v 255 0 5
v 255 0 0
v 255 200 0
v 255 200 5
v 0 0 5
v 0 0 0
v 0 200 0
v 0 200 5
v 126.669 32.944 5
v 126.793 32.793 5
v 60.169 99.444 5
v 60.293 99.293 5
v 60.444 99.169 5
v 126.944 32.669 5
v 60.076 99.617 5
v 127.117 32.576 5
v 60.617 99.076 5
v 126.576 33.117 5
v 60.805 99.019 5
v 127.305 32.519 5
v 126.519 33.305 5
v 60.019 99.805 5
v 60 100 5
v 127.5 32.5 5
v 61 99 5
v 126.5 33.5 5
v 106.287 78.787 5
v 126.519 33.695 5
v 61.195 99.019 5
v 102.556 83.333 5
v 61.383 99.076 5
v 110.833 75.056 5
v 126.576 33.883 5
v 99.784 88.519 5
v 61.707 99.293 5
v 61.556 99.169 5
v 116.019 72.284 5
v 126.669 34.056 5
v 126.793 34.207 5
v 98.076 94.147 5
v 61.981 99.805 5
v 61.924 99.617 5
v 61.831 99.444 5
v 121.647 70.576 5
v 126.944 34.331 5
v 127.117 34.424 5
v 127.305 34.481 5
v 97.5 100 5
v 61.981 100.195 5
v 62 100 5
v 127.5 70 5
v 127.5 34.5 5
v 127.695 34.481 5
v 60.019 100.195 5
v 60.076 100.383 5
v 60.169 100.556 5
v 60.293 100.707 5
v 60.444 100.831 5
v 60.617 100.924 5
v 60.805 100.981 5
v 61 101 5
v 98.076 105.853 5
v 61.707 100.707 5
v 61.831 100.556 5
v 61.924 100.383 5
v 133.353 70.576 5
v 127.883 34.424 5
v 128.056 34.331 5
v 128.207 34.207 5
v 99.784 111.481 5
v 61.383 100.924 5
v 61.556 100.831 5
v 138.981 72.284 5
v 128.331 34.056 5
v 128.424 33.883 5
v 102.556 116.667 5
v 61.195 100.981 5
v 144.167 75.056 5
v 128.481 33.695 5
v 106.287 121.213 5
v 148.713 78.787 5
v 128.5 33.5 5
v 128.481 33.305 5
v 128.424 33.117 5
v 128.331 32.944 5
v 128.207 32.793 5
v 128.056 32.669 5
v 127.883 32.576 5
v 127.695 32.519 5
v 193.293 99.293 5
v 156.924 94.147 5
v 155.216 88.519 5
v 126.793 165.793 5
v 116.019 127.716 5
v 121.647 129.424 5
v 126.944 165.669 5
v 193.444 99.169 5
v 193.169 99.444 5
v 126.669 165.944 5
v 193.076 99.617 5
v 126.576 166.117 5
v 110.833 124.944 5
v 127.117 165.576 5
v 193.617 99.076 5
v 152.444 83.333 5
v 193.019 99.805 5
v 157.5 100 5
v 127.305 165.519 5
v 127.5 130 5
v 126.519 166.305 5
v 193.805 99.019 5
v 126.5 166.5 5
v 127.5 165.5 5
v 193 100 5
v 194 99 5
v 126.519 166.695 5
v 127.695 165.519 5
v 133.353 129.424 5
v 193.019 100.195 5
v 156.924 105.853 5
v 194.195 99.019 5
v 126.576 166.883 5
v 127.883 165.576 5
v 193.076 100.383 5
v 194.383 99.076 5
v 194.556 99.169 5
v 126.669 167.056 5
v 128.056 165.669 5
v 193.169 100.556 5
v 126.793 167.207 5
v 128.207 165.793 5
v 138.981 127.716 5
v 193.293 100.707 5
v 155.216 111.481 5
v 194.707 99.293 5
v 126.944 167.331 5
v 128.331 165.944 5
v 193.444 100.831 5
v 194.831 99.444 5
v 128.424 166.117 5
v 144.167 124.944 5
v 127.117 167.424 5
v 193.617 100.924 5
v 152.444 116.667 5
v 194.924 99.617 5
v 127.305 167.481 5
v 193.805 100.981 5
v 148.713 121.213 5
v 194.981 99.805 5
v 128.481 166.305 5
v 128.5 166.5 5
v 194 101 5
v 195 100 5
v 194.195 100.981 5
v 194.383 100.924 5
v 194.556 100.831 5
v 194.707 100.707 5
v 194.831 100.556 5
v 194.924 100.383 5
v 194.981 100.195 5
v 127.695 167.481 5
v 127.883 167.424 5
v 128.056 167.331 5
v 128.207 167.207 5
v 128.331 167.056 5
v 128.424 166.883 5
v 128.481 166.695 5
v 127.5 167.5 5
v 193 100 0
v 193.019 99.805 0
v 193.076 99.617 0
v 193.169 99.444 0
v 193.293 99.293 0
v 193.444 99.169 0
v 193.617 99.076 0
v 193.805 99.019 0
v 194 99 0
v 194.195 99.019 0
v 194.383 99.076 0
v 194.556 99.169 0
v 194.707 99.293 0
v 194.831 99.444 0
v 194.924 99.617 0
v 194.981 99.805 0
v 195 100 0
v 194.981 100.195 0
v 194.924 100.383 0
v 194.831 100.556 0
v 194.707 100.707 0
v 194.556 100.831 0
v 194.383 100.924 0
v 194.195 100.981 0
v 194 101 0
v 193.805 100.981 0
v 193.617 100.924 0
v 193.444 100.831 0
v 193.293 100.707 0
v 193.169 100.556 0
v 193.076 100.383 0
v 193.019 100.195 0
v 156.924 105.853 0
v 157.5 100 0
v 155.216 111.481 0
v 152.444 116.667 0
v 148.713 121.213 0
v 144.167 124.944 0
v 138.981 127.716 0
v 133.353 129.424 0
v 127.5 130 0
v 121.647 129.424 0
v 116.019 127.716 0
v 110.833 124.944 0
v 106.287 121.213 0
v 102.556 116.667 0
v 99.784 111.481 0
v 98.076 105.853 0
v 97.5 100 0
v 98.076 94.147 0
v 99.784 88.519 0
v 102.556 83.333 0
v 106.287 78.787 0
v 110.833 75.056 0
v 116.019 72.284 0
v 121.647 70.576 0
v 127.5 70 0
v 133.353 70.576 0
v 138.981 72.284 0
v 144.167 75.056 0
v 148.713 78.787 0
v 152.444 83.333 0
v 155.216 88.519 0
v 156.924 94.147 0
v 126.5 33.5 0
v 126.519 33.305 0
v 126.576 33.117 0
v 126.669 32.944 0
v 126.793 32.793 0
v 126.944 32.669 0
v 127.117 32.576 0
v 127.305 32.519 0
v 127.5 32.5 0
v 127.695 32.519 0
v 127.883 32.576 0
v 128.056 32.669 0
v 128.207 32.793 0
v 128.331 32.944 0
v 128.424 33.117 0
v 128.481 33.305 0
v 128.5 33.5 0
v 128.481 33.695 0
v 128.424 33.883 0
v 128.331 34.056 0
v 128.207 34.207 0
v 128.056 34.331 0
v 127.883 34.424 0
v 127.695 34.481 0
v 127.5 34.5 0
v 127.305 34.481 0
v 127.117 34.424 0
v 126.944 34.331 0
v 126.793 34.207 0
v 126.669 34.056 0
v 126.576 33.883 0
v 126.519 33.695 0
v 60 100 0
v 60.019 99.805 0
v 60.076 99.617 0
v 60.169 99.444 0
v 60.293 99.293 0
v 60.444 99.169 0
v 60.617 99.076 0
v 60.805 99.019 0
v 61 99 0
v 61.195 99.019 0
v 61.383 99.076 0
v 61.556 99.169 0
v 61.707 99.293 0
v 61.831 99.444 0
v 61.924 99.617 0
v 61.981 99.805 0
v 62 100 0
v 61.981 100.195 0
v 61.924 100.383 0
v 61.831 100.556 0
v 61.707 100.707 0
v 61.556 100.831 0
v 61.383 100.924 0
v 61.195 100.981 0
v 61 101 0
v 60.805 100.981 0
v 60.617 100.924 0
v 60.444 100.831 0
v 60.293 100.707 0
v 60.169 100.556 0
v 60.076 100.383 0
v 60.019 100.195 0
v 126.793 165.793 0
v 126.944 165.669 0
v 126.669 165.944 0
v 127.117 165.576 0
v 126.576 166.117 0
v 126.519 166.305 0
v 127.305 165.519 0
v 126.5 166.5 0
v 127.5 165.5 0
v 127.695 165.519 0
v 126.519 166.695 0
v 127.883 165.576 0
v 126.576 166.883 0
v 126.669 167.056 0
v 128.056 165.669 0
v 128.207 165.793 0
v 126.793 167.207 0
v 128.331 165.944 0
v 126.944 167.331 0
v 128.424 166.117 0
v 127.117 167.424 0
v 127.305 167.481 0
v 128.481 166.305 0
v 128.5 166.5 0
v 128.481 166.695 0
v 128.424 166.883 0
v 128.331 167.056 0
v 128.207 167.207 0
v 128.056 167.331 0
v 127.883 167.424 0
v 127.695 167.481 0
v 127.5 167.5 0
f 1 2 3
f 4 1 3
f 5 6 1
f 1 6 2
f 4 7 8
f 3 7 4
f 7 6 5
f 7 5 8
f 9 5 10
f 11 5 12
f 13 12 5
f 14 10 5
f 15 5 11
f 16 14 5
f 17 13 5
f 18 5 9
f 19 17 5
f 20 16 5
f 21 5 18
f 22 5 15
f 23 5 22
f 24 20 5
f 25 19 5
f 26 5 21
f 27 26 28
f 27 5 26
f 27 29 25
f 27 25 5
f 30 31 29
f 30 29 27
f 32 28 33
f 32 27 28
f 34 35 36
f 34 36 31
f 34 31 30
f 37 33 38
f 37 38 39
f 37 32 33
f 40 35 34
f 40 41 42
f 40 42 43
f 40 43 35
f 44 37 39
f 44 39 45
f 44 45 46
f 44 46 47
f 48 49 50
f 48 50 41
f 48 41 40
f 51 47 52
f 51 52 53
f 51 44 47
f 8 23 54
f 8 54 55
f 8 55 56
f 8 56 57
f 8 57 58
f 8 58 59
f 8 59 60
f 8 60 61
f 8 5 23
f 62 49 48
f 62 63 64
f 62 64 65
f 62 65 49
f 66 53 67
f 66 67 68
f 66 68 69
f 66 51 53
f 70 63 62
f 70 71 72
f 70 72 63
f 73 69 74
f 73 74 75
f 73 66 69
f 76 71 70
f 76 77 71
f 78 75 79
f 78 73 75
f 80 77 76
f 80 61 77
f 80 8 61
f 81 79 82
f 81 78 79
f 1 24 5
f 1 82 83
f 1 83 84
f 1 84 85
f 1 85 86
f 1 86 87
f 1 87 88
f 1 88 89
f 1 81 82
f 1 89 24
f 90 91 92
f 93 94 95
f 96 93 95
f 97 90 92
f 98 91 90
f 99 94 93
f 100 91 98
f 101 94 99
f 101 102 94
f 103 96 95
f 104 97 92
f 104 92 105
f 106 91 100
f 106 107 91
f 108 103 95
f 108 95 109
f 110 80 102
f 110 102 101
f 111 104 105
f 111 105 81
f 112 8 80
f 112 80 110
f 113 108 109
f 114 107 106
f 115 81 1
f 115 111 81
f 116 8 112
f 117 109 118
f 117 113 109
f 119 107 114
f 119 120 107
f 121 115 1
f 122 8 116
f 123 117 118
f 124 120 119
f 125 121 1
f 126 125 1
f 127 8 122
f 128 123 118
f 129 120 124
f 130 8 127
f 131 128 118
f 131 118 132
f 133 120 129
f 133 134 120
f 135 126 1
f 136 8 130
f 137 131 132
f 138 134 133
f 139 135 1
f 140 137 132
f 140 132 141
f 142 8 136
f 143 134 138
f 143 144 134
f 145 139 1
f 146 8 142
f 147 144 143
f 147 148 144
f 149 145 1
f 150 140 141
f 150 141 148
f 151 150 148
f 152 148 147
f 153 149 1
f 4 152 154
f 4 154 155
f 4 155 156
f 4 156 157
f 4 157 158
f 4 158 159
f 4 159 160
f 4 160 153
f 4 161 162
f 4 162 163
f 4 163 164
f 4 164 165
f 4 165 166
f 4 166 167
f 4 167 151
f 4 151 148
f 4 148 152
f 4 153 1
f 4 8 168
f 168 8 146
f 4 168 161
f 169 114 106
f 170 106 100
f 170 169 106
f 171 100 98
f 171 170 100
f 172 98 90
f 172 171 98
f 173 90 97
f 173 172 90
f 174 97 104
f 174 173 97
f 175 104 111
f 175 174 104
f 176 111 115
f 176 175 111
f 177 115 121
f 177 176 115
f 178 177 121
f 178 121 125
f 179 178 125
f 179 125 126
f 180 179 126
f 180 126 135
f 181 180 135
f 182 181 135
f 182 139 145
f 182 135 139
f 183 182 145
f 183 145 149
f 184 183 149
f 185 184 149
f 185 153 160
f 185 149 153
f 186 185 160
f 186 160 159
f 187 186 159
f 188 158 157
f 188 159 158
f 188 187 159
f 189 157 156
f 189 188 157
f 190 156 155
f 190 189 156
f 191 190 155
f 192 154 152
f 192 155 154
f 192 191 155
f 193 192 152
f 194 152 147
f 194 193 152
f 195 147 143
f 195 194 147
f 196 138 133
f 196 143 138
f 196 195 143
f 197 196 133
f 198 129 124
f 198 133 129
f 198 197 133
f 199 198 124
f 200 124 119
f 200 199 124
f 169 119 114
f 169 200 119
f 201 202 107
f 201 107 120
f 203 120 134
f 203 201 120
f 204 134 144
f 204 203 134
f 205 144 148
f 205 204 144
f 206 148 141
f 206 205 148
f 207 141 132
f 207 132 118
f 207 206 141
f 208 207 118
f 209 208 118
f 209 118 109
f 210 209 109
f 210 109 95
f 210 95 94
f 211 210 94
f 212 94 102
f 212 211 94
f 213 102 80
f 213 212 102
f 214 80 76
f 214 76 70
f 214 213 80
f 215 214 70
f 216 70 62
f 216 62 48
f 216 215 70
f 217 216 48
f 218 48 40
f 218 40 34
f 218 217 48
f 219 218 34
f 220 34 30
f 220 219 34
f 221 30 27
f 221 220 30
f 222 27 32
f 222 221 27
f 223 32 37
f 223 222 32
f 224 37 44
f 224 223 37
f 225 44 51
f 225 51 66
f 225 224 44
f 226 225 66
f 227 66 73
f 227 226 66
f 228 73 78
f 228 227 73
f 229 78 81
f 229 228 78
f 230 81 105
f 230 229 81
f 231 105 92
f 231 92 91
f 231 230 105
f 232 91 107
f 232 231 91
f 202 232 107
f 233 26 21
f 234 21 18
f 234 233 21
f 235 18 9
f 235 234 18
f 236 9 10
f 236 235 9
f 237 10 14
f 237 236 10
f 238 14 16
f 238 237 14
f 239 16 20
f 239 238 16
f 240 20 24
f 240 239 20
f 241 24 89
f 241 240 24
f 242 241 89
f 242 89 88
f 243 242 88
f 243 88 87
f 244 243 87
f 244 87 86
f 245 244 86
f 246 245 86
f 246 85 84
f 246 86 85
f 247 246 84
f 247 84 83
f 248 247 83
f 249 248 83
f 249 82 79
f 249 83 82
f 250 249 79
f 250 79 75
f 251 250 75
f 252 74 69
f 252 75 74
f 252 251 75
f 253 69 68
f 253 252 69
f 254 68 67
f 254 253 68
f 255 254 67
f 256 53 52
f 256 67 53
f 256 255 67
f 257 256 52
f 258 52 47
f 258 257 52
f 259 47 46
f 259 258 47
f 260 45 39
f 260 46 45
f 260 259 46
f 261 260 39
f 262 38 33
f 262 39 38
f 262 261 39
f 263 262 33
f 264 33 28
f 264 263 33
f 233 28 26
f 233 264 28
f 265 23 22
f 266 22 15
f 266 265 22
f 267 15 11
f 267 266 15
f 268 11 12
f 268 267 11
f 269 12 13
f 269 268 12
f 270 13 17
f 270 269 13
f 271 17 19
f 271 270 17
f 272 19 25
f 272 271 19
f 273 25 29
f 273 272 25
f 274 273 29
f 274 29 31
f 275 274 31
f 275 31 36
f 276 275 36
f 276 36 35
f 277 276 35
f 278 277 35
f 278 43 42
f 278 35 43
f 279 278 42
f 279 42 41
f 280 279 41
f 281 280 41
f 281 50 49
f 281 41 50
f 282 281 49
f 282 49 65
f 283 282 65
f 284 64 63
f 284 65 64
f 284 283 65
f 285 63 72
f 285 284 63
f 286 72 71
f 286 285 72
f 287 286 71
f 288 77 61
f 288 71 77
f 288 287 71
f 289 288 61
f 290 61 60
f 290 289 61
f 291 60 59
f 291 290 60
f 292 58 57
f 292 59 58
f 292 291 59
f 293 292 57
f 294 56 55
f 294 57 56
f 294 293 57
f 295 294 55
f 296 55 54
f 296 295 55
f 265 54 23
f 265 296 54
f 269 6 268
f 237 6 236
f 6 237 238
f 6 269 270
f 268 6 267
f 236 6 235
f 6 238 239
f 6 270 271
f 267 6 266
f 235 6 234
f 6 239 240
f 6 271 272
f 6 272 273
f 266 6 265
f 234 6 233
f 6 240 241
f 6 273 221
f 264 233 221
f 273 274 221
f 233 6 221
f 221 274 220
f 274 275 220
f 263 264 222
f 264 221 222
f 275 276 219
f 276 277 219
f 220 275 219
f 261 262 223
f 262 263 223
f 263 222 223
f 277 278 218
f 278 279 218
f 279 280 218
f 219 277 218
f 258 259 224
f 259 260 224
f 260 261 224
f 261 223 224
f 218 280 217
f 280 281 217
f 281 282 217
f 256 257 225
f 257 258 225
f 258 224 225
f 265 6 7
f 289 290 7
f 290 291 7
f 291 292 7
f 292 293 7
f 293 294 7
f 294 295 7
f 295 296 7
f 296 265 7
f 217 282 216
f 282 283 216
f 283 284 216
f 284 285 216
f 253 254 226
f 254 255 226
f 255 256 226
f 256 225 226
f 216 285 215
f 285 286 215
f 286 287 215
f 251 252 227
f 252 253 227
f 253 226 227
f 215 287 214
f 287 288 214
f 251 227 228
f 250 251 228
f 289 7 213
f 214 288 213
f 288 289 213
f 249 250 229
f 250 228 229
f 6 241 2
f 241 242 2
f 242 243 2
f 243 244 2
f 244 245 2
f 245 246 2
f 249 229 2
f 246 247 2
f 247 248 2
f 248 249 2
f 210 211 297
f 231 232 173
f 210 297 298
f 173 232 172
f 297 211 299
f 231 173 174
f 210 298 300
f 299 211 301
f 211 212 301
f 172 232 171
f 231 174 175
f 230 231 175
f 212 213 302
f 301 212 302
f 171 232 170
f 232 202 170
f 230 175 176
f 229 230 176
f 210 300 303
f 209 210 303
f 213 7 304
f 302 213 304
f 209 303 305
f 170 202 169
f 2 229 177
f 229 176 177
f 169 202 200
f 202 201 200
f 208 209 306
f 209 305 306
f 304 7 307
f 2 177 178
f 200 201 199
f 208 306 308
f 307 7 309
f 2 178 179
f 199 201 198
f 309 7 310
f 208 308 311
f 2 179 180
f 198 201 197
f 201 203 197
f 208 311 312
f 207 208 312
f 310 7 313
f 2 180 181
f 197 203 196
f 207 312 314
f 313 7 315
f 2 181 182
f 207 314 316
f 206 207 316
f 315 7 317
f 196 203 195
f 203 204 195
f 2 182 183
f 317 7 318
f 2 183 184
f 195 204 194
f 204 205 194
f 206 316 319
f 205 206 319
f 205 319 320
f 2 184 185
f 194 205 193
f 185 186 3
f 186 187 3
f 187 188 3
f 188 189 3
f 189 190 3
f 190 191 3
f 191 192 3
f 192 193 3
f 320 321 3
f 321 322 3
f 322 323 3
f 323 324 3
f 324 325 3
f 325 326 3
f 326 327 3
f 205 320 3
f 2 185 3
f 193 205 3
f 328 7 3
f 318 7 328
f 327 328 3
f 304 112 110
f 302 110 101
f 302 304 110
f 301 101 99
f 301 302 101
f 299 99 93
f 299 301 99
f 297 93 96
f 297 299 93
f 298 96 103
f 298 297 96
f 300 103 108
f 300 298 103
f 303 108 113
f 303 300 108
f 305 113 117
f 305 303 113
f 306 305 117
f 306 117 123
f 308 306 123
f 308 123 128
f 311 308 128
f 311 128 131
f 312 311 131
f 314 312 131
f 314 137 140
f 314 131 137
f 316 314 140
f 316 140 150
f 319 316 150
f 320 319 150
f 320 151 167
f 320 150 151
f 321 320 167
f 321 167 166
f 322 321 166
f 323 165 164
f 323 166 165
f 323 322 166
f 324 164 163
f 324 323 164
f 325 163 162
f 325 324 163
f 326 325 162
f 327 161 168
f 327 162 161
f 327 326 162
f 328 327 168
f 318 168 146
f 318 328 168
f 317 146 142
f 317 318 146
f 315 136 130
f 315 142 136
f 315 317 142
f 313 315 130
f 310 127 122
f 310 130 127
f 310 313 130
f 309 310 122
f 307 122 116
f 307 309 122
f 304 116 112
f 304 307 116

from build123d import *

# Parameters (mm, degrees)
SKETCH1_W           = 255
SKETCH1_H           = 200
SKETCH1_R           = 30
BOSS_EXTRUDE1_DEPTH = 5
SKETCH2_R           = 1
CUT_EXTRUDE1_DEPTH  = 28


with BuildPart() as part:
    # Sketch1 → Boss-Extrude1 (new body)
    with BuildSketch(Plane.XY):
        with Locations((127.5, 100)):
            Rectangle(SKETCH1_W, SKETCH1_H)
        with Locations((127.5, 100)):
            Circle(SKETCH1_R, mode=Mode.SUBTRACT)
    extrude(amount=BOSS_EXTRUDE1_DEPTH)

    # Sketch2 → Cut-Extrude1 (cut)
    with BuildSketch(Plane.XY):
        with Locations(Location((61, 100, 0), (0, 0, 180))):
            Circle(SKETCH2_R)
        with Locations(Location((127.5, 166.5, 0), (0, 0, 180))):
            Circle(SKETCH2_R)
        with Locations(Location((194, 100, 0), (0, 0, 180))):
            Circle(SKETCH2_R)
        with Locations(Location((127.5, 33.5, 0), (0, 0, 180))):
            Circle(SKETCH2_R)
    extrude(amount=CUT_EXTRUDE1_DEPTH, mode=Mode.SUBTRACT)


solid = part.part
